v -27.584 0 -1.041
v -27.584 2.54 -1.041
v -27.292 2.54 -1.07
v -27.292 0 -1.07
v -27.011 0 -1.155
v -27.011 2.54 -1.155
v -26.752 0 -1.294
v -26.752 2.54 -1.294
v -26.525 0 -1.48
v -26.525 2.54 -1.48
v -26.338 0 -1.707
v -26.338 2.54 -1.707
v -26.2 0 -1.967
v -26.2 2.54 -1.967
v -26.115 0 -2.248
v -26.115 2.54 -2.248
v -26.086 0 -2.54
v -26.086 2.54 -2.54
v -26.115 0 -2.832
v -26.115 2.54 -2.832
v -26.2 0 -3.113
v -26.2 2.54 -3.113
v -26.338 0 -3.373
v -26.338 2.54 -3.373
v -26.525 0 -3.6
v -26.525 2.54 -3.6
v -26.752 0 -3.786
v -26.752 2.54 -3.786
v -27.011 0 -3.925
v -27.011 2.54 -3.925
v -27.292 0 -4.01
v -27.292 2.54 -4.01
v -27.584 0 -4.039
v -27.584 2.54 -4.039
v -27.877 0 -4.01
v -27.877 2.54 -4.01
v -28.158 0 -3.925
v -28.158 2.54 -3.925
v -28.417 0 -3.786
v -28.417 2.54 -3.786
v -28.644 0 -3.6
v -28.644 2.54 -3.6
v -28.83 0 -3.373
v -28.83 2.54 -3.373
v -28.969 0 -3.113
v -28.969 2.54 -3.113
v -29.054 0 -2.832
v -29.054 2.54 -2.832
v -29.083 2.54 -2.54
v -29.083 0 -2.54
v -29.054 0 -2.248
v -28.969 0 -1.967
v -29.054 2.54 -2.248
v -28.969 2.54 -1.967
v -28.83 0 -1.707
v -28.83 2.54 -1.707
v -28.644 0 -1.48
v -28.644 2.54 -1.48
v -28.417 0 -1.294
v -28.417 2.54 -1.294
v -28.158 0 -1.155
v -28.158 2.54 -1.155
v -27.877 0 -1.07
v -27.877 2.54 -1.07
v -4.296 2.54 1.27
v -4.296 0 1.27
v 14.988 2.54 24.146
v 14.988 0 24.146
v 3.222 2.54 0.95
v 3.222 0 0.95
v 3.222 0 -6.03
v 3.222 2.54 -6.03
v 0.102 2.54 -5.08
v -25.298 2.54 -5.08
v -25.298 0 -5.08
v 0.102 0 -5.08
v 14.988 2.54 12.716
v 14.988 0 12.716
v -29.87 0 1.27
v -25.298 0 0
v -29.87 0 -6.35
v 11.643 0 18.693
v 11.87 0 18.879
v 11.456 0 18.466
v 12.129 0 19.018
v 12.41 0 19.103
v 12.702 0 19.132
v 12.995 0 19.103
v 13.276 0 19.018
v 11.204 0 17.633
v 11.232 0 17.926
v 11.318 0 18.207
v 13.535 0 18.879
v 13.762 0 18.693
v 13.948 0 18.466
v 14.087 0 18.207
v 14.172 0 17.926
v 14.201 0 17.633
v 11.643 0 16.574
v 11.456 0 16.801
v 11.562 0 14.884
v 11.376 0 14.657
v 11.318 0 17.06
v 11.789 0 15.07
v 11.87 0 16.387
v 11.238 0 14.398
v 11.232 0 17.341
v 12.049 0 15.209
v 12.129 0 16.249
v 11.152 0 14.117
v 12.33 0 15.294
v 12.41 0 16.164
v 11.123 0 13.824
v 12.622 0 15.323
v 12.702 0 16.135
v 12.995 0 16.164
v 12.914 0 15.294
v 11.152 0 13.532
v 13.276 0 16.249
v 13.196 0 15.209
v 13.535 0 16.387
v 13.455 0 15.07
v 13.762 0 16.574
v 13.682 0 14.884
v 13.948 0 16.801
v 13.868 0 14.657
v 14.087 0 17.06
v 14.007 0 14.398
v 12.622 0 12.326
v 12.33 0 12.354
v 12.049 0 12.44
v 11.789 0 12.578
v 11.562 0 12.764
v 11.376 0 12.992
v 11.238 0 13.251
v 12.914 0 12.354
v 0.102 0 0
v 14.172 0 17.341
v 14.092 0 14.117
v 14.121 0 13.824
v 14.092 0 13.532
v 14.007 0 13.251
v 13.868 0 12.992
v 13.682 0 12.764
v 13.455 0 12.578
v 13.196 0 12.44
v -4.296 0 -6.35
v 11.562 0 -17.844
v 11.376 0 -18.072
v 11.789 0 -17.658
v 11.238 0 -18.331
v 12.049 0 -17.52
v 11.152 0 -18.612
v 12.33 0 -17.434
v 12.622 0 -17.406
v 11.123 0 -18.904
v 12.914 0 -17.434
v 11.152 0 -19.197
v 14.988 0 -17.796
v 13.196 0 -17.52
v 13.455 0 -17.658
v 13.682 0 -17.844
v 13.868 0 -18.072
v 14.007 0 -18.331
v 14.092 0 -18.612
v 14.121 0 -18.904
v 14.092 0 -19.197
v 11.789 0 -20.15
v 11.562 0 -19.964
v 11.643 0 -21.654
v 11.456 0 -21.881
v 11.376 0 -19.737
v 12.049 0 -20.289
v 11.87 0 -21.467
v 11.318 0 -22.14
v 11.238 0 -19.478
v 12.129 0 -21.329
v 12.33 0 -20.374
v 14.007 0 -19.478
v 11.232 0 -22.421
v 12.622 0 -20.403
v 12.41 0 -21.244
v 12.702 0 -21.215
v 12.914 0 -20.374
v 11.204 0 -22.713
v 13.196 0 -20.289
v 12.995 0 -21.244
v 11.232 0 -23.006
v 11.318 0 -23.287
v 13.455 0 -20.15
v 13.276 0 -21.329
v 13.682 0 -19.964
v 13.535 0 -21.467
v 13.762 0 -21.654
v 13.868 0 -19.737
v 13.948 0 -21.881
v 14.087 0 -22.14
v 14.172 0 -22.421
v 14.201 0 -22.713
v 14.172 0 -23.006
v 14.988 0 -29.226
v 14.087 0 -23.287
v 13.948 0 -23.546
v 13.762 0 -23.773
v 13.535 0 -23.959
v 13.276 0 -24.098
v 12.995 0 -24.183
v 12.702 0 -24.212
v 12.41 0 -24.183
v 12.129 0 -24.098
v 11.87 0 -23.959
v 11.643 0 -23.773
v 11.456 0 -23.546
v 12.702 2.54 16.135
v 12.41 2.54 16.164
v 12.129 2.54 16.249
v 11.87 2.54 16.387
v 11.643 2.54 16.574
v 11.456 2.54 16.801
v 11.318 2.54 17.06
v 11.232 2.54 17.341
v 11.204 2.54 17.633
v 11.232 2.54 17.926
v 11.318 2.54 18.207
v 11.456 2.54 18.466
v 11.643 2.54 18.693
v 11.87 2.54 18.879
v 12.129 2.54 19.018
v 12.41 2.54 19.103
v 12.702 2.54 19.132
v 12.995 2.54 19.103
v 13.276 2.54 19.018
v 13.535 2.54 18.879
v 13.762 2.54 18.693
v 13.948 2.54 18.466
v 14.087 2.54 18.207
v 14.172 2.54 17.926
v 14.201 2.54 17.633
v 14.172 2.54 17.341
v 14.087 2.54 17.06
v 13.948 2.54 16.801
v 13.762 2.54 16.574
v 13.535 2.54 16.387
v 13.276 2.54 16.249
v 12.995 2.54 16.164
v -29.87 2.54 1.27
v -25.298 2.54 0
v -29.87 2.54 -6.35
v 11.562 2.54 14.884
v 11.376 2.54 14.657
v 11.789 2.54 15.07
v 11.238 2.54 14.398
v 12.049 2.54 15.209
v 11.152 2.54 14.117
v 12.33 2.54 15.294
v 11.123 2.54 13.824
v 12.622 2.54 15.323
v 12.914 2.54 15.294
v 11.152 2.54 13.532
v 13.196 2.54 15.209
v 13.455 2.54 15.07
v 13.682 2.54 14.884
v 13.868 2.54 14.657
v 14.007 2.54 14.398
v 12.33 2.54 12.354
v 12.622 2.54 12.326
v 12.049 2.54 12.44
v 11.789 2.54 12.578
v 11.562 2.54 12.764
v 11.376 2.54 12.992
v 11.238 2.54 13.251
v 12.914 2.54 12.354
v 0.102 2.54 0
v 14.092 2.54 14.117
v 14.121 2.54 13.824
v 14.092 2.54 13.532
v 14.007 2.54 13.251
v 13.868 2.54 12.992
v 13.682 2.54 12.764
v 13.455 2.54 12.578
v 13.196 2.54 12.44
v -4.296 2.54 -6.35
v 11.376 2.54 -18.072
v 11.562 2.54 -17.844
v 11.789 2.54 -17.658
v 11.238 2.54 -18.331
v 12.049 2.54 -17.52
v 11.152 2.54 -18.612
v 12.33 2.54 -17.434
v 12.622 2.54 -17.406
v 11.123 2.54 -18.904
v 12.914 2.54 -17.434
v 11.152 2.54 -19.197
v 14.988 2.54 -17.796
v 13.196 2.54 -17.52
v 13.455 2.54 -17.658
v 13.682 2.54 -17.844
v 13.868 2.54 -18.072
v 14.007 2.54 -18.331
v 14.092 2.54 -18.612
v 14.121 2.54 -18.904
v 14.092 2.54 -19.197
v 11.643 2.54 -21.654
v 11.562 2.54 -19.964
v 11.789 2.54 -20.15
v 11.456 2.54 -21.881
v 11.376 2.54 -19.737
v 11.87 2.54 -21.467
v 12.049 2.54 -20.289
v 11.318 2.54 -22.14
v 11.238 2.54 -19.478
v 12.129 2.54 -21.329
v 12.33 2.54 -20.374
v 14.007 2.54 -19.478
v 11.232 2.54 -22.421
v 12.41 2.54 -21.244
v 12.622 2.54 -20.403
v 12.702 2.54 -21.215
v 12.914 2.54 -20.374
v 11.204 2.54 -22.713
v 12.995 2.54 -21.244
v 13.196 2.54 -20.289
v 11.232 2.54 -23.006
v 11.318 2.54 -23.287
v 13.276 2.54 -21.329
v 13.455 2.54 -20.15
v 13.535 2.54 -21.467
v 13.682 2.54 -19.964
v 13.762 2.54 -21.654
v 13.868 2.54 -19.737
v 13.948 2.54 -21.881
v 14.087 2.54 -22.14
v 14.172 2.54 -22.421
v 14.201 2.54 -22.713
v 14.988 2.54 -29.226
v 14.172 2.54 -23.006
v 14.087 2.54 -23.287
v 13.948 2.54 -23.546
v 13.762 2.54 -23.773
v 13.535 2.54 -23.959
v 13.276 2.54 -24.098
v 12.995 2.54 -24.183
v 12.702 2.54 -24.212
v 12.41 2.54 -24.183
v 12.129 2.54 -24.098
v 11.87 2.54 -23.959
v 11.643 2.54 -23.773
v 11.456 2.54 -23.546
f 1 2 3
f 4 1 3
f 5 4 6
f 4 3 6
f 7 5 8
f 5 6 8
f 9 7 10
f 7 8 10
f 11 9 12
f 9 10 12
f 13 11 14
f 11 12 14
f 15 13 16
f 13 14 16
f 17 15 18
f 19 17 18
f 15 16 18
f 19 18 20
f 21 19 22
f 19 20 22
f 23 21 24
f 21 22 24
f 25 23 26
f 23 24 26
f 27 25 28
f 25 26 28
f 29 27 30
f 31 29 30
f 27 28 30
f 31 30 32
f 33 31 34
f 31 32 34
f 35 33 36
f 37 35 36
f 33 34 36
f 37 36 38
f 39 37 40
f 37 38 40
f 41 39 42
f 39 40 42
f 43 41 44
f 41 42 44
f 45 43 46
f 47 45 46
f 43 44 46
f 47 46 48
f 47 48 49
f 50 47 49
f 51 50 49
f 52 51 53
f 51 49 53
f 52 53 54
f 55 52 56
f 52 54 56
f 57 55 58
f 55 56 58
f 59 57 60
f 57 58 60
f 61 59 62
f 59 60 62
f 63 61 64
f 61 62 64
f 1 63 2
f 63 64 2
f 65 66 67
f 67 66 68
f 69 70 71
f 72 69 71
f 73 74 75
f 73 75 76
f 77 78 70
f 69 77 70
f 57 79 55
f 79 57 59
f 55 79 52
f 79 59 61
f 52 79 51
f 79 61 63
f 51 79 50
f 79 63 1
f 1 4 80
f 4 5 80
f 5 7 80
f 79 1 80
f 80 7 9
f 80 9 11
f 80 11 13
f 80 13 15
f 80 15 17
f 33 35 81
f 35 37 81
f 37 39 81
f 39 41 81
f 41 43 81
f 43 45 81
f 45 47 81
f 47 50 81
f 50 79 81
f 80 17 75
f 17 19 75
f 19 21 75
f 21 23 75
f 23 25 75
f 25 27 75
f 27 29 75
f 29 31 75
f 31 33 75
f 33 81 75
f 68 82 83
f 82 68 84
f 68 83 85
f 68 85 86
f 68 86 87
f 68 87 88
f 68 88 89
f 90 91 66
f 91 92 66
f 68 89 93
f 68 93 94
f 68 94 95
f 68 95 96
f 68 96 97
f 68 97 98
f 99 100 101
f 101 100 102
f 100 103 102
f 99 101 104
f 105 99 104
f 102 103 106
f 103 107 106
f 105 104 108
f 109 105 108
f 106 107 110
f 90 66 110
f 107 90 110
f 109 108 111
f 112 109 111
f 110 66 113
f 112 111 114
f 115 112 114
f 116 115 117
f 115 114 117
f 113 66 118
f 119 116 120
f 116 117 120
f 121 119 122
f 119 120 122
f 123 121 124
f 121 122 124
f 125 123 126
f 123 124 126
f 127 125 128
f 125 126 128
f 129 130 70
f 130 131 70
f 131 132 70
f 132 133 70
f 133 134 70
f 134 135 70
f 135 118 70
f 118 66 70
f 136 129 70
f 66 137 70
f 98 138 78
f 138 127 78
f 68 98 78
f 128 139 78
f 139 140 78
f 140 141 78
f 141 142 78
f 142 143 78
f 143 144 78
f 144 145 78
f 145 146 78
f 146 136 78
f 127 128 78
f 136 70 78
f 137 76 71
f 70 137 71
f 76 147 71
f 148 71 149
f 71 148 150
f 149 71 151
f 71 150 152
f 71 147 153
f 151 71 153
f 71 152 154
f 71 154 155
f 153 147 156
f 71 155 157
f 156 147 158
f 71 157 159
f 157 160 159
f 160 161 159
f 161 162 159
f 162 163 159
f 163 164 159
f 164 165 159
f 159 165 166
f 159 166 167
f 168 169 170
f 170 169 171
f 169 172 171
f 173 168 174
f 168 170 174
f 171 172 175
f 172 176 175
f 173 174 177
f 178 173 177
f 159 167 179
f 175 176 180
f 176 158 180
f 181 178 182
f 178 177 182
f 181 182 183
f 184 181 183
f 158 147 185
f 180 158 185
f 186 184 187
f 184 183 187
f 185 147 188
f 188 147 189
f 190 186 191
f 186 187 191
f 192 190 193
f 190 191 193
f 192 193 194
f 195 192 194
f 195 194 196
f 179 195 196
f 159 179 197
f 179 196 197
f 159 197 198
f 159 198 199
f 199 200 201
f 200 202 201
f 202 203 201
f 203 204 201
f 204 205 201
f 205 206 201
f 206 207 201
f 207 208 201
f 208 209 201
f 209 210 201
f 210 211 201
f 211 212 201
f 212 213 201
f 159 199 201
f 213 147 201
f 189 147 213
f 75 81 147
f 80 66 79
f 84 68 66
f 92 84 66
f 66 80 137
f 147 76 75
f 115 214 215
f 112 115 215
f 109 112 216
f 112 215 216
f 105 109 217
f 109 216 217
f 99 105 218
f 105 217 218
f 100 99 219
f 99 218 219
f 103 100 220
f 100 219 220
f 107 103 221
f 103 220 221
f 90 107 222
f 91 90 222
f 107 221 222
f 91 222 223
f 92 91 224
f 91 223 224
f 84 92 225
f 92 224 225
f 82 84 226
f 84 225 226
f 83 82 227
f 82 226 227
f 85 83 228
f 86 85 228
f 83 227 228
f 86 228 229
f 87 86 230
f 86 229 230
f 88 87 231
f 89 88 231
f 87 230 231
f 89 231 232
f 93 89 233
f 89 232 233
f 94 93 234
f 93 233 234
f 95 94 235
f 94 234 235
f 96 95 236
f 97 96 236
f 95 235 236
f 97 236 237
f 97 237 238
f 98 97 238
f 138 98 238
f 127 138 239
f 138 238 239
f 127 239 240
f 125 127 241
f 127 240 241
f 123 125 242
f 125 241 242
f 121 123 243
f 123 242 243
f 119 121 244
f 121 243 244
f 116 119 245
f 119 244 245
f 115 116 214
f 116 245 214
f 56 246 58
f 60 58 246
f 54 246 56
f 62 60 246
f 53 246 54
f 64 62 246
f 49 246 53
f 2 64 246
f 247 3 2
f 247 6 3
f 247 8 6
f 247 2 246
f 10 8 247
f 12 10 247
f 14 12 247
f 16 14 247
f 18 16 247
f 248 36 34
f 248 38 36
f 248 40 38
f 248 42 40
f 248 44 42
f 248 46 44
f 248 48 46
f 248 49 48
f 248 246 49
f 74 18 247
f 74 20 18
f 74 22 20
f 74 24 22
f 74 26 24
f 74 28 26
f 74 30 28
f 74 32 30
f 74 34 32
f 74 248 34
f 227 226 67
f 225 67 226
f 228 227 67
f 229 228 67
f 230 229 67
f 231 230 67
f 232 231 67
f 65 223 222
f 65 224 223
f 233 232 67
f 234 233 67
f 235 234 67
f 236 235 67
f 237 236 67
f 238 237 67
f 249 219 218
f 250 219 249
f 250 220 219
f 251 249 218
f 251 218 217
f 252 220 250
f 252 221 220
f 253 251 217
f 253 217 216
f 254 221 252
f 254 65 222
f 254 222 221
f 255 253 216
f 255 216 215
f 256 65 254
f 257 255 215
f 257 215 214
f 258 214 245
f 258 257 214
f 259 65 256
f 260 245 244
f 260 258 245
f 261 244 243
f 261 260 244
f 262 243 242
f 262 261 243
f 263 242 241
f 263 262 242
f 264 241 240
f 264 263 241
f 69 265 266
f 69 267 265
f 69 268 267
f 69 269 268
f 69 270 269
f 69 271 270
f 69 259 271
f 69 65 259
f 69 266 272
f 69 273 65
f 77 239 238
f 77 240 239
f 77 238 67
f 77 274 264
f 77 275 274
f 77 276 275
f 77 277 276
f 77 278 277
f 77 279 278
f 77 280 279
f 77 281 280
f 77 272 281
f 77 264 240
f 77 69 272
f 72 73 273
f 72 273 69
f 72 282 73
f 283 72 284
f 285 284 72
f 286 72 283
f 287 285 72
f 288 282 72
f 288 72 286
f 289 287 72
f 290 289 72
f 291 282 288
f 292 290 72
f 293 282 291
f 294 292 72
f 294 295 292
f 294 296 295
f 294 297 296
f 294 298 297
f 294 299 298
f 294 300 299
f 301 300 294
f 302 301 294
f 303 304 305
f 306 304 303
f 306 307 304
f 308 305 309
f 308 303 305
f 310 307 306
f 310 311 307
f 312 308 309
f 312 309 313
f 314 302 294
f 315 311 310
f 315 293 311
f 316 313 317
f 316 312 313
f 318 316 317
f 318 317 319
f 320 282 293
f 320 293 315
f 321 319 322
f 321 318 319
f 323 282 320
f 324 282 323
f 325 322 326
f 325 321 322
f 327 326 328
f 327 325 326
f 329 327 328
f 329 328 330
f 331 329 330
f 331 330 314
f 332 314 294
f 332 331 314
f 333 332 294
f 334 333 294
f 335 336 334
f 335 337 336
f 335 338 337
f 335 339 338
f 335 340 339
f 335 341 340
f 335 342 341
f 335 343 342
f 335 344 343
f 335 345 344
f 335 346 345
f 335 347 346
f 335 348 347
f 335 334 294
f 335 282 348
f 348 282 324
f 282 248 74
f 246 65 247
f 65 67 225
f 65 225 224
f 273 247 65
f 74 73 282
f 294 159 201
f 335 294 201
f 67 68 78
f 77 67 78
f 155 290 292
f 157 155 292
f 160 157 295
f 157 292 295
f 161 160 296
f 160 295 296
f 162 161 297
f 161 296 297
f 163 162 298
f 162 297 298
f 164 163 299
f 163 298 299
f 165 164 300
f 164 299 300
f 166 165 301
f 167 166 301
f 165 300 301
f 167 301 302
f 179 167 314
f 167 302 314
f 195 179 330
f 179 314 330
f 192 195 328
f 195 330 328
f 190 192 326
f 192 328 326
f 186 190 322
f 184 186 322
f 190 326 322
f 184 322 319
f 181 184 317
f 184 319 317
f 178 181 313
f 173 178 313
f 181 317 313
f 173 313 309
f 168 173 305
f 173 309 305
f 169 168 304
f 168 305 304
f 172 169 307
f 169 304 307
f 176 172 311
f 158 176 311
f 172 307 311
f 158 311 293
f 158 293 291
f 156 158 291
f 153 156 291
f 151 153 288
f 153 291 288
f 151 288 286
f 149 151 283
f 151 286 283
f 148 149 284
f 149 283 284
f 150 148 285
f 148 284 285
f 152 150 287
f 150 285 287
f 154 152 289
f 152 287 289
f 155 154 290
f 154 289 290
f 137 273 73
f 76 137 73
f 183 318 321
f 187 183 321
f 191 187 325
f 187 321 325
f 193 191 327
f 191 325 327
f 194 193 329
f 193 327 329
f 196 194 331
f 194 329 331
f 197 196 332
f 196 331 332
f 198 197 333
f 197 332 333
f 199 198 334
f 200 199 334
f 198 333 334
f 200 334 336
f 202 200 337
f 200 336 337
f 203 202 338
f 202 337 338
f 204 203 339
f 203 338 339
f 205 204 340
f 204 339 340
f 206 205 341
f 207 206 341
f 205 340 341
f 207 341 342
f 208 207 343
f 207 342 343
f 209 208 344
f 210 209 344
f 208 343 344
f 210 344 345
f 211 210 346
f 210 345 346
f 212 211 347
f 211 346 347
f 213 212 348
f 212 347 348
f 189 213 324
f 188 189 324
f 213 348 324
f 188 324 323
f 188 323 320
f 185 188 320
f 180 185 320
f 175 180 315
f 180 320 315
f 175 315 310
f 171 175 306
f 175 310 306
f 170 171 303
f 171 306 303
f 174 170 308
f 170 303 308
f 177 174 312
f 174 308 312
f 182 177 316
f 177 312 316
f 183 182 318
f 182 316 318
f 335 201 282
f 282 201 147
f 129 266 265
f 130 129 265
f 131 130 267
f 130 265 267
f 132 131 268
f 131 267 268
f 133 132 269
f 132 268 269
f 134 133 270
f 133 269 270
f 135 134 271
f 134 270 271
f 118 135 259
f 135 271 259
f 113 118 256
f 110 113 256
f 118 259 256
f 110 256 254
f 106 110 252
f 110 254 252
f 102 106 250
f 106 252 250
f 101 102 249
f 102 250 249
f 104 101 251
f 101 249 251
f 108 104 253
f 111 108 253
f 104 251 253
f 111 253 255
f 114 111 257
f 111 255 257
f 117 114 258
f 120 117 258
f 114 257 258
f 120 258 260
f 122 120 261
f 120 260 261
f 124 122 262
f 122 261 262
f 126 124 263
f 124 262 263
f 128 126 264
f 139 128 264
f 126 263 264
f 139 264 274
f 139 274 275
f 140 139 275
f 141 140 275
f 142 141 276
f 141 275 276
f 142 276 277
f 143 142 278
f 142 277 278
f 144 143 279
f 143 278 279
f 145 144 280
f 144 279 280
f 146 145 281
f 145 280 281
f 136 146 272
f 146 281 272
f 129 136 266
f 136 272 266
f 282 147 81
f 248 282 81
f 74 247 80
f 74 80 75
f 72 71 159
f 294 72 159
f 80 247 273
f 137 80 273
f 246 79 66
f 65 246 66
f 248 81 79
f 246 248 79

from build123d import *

# Parameters (mm, degrees)
BOSS_EXTRUDE2_DEPTH = 2.54
SKETCH7_R           = 1.4986
SKETCH7_W           = 25.4
SKETCH7_H           = 5.08
CUT_EXTRUDE1_DEPTH  = 2.54


with BuildPart() as part:
    # Sketch1 → Boss-Extrude2 (new body)
    with BuildSketch(Plane(origin=(0, 0, 0), x_dir=(1, 0, 0), z_dir=(0, 1, 0))):
        Polygon((3.221868426, 6.029765094), (14.988277627, 17.796174295), (14.988277627, 29.226174295), (-4.295819053, 6.35), (-29.8704, 6.35), (-29.8704, -1.27), (-4.295819053, -1.27), (14.988277627, -24.146174295), (14.988277627, -12.716174295), (3.221868426, -0.949765094), align=None)
    extrude(amount=BOSS_EXTRUDE2_DEPTH)

    # Sketch7 → Cut-Extrude1 (cut)
    with BuildSketch(Plane(origin=(0, 2.54, 0), x_dir=(1, 0, 0), z_dir=(0, 1, 0))):
        with Locations(Location((-27.5844, 2.54, 0), (0, 0, 270))):
            Circle(SKETCH7_R)
        with Locations(Location((12.702277627, 22.713311162, 0), (0, 0, 270))):
            Circle(SKETCH7_R)
        with Locations(Location((12.622030753, 18.904156343, 0), (0, 0, 270))):
            Circle(SKETCH7_R)
        with Locations(Location((12.622030753, -13.824156343, 0), (0, 0, 90))):
            Circle(SKETCH7_R)
        with Locations(Location((12.702277627, -17.633311162, 0), (0, 0, 90))):
            Circle(SKETCH7_R)
        with Locations((-12.5984, 2.54)):
            Rectangle(SKETCH7_W, SKETCH7_H)
    extrude(amount=-CUT_EXTRUDE1_DEPTH, mode=Mode.SUBTRACT)


solid = part.part
